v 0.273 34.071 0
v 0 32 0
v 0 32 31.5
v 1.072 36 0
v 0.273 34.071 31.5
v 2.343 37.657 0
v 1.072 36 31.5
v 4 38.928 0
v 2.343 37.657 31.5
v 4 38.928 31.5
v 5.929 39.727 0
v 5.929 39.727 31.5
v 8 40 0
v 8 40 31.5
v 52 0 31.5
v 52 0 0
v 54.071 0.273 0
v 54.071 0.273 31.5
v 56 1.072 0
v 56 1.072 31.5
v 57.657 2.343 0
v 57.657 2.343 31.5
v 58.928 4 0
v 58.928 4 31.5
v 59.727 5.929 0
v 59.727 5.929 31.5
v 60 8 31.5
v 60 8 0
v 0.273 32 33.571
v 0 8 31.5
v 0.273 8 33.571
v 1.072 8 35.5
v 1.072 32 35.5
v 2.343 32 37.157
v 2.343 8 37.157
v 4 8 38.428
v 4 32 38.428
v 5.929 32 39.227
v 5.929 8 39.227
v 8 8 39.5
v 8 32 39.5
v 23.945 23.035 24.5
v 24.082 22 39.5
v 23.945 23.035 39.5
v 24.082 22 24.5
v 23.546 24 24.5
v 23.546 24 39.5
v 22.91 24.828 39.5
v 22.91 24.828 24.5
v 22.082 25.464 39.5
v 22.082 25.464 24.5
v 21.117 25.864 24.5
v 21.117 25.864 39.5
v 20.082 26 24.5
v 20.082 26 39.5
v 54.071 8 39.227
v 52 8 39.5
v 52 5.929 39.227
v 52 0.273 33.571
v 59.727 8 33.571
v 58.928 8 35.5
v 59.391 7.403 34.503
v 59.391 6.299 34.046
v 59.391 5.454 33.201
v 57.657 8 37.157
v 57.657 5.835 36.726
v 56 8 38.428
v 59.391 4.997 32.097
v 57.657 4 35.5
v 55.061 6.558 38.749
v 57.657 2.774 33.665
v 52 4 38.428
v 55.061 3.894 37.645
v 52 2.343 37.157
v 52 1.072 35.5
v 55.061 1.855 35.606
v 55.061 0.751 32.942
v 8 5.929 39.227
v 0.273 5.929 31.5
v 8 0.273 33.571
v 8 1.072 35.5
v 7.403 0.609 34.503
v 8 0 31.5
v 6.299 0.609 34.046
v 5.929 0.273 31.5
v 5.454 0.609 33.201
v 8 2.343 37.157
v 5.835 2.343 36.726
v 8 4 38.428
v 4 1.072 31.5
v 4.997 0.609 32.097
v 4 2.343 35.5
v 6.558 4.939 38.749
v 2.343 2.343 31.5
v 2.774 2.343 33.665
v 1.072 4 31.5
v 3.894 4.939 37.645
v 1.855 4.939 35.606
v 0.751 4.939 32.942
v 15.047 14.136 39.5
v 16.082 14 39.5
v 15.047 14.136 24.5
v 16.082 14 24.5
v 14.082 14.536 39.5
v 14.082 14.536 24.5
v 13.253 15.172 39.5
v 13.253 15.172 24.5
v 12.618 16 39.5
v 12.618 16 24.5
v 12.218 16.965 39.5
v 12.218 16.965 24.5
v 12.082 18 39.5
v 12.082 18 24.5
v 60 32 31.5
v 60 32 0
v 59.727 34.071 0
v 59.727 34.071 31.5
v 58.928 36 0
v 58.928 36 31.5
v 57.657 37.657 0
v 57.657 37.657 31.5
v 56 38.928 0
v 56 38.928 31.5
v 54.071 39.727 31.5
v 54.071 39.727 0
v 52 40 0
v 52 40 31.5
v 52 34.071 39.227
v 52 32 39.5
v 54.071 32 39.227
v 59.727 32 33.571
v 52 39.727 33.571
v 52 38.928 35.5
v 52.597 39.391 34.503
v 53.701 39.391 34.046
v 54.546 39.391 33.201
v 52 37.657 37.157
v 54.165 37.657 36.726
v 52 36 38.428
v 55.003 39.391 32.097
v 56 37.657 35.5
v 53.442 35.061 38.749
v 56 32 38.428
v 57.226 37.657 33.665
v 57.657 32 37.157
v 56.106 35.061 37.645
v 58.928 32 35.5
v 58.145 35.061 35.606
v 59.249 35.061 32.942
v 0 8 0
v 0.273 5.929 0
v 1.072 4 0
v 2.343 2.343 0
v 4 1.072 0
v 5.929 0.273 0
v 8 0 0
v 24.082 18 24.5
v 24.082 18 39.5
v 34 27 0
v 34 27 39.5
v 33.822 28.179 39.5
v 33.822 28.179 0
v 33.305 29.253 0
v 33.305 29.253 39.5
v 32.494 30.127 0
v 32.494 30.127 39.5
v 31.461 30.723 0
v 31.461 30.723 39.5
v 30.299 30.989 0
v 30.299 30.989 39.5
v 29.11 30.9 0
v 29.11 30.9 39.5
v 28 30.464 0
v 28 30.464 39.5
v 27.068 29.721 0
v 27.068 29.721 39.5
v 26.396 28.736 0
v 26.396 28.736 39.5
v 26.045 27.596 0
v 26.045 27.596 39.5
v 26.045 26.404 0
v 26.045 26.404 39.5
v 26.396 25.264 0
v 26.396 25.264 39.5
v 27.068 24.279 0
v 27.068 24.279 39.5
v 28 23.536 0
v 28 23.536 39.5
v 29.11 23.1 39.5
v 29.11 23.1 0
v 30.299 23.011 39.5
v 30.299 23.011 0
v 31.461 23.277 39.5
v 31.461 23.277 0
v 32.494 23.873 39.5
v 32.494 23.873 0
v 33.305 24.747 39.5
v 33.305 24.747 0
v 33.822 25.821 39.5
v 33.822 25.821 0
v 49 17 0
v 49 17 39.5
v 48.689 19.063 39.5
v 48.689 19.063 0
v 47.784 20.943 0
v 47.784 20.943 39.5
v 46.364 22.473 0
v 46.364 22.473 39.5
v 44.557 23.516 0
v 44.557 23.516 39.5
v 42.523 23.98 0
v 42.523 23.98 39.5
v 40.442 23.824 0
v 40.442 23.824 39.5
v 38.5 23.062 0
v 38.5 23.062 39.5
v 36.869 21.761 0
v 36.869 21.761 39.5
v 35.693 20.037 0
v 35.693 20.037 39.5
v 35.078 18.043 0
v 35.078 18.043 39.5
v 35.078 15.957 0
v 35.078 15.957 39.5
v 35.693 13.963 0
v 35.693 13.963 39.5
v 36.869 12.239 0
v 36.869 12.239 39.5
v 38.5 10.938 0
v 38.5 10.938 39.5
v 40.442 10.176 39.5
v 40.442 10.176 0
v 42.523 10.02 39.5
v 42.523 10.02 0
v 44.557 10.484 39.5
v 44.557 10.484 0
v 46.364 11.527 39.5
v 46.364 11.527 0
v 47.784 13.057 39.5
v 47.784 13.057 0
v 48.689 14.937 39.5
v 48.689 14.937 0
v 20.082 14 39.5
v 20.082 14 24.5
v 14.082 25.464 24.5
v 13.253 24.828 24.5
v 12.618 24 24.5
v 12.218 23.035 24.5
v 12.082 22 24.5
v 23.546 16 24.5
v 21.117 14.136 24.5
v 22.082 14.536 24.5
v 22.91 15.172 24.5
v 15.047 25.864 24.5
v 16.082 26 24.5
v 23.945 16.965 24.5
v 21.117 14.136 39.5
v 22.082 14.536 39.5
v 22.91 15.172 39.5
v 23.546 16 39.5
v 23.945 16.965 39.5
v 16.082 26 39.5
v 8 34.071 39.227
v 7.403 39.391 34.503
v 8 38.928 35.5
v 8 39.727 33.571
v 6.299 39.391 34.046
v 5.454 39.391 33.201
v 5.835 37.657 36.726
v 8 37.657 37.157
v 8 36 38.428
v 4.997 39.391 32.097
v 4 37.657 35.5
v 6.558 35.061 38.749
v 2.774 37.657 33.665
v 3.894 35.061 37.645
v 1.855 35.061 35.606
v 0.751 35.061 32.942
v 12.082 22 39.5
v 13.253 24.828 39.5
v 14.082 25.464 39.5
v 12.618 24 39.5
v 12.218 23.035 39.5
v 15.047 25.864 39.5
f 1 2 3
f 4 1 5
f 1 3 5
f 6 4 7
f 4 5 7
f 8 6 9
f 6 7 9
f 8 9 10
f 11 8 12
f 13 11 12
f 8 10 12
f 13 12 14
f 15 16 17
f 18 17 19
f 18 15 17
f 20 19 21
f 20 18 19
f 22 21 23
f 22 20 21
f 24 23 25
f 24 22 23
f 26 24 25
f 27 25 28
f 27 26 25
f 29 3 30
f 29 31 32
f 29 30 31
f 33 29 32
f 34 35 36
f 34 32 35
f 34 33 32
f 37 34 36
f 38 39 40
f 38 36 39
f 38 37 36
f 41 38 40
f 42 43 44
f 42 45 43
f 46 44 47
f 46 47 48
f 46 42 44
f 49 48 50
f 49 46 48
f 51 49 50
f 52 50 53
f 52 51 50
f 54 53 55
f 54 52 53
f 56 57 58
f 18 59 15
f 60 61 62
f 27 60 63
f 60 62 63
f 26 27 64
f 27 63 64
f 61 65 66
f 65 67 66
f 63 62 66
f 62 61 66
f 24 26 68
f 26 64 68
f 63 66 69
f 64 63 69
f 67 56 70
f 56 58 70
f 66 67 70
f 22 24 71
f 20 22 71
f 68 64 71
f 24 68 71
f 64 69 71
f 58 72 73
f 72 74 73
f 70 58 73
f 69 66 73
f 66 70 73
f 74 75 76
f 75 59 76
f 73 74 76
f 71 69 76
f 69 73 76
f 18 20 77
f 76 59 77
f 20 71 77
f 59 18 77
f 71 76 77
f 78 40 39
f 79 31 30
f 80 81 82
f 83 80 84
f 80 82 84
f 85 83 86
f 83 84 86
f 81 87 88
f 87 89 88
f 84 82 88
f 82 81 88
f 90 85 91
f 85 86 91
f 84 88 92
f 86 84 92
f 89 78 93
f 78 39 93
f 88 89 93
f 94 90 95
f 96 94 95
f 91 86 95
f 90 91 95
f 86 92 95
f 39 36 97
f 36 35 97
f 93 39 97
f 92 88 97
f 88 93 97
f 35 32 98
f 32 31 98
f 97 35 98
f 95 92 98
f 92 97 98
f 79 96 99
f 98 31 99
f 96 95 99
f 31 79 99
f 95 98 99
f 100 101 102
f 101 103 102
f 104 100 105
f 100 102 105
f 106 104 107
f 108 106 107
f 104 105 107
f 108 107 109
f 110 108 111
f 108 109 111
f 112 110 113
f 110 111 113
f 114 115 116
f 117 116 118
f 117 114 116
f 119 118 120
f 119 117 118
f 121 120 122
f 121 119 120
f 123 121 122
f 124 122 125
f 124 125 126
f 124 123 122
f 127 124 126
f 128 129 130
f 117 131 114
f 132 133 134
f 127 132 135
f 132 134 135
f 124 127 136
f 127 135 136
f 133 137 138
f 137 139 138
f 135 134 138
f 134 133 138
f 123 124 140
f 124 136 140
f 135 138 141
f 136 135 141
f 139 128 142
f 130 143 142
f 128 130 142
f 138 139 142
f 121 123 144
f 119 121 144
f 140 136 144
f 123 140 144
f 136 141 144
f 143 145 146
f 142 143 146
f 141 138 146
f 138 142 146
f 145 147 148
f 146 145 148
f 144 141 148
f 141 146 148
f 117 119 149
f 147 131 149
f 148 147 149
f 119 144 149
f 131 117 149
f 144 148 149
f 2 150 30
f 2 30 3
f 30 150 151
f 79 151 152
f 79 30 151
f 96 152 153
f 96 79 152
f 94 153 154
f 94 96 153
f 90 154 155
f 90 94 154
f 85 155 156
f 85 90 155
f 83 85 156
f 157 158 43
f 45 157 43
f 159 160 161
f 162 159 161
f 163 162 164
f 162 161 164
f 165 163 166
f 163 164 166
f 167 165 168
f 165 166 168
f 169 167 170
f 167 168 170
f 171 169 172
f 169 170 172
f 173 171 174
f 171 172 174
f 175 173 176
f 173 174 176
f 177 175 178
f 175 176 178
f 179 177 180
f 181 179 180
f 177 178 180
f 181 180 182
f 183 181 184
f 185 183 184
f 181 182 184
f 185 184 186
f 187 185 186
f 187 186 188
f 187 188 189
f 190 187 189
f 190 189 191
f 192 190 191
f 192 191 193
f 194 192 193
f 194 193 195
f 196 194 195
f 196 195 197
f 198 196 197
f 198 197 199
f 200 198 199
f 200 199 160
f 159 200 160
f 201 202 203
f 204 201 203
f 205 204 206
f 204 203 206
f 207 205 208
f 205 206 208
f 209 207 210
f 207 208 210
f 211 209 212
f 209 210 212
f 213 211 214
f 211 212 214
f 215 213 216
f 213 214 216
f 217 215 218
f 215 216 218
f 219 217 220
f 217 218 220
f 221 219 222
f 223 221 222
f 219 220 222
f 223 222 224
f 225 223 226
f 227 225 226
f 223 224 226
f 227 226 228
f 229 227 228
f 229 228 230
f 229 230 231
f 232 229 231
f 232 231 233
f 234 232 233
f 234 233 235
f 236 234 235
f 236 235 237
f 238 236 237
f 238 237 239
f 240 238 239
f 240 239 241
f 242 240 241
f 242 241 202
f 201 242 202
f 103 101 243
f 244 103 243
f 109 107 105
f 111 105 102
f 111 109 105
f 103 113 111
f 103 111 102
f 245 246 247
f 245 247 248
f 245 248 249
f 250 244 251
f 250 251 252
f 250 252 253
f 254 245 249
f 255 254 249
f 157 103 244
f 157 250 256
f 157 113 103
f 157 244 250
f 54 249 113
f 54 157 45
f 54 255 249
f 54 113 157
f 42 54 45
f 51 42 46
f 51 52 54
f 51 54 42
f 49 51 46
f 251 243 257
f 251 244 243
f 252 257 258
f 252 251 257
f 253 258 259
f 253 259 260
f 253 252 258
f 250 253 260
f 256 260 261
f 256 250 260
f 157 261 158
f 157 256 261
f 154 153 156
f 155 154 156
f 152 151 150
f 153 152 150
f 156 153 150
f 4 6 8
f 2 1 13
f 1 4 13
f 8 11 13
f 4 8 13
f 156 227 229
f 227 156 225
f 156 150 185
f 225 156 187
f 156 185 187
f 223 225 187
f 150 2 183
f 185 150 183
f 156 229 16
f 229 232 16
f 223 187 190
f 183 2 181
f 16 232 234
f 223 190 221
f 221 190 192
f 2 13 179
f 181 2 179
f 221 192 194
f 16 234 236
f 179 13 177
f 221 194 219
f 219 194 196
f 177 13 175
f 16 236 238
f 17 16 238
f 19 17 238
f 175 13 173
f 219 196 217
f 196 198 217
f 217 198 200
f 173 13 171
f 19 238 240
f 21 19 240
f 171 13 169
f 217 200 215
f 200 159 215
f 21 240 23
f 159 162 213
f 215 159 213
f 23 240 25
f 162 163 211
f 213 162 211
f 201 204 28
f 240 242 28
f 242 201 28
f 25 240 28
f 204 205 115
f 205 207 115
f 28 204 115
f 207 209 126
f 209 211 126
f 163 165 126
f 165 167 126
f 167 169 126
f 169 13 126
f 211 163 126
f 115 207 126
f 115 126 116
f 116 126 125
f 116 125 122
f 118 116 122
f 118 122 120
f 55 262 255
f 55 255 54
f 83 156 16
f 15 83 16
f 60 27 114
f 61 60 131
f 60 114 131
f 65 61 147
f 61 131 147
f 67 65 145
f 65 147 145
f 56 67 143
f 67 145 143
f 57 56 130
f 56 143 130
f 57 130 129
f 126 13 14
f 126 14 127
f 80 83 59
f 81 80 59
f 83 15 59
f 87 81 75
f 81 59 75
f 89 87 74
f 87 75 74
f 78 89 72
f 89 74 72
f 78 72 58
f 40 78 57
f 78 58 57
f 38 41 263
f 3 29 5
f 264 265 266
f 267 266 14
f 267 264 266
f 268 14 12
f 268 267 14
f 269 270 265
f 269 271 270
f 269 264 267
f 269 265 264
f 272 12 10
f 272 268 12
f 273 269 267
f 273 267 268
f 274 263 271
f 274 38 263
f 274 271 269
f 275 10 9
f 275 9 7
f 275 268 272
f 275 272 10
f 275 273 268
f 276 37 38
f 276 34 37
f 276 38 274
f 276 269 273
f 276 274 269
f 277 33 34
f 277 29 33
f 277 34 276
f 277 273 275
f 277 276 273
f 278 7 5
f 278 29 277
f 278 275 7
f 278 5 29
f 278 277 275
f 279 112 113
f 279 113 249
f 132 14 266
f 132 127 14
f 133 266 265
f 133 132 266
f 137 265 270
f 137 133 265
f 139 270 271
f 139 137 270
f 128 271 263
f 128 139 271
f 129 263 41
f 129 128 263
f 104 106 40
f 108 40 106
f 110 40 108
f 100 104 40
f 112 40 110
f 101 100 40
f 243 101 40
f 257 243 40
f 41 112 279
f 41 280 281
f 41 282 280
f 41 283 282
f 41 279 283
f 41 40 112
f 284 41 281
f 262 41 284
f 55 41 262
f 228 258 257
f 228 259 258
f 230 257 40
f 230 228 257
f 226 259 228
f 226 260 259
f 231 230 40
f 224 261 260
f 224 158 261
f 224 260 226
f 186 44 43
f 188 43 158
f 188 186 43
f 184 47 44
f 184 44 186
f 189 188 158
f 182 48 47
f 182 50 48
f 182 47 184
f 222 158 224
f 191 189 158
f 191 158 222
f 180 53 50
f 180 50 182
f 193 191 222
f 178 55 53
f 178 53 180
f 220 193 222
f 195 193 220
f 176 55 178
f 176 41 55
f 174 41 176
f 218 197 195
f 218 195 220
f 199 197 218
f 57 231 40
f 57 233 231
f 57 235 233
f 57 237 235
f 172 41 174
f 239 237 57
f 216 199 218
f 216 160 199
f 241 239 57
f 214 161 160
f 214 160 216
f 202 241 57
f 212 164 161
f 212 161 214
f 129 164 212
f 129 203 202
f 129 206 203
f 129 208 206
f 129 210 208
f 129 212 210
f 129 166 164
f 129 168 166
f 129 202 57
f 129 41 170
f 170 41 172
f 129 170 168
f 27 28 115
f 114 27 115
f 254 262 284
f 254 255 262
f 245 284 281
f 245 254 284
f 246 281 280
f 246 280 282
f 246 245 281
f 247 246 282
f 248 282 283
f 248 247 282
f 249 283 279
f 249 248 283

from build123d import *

# Parameters (mm, degrees)
F0_W     = 60
F0_H     = 40
F1_DEPTH = 39.5
F2_R     = 8
F3_W     = 12
F3_H     = 12
F4_DEPTH = 15
F5_R     = 4
F6_R     = 4
F6_R_2   = 7
F7_DEPTH = 39.501


with BuildPart() as f1:
    # F0 (on Top) → F1 (new body)
    with BuildSketch(Plane.XY):
        with Locations((30, 20)):
            Rectangle(F0_W, F0_H)
    extrude(amount=F1_DEPTH)

    # F2
    f2_edges = [f1.edges().sort_by_distance(p)[0] for p in [
        (0, 20, 39.5),
        (30, 0, 39.5),
        (60, 20, 39.5),
        (30, 40, 39.5),
        (60, 0, 19.75),
        (60, 40, 19.75),
        (0, 0, 19.75),
        (0, 40, 19.75),
    ]]
    fillet(f2_edges, radius=F2_R)

    # F3 (on face) → F4 (cut)
    with BuildSketch(Plane.XY.offset(39.5)):
        with Locations((18.08178, 20)):
            Rectangle(F3_W, F3_H)
    extrude(amount=-F4_DEPTH, mode=Mode.SUBTRACT)

    # F5
    f5_edges = [f1.edges().sort_by_distance(p)[0] for p in [
        (12.08178, 26, 32),
        (12.08178, 14, 32),
        (24.08178, 26, 32),
        (24.08178, 14, 32),
    ]]
    fillet(f5_edges, radius=F5_R)

    # F6 (on face) → F7 (cut, through all)
    with BuildSketch(Plane.XY.offset(39.5)):
        with Locations((30, 27)):
            Circle(F6_R)
        with Locations((42, 17)):
            Circle(F6_R_2)
    extrude(amount=-F7_DEPTH, mode=Mode.SUBTRACT)


solid = f1.part
